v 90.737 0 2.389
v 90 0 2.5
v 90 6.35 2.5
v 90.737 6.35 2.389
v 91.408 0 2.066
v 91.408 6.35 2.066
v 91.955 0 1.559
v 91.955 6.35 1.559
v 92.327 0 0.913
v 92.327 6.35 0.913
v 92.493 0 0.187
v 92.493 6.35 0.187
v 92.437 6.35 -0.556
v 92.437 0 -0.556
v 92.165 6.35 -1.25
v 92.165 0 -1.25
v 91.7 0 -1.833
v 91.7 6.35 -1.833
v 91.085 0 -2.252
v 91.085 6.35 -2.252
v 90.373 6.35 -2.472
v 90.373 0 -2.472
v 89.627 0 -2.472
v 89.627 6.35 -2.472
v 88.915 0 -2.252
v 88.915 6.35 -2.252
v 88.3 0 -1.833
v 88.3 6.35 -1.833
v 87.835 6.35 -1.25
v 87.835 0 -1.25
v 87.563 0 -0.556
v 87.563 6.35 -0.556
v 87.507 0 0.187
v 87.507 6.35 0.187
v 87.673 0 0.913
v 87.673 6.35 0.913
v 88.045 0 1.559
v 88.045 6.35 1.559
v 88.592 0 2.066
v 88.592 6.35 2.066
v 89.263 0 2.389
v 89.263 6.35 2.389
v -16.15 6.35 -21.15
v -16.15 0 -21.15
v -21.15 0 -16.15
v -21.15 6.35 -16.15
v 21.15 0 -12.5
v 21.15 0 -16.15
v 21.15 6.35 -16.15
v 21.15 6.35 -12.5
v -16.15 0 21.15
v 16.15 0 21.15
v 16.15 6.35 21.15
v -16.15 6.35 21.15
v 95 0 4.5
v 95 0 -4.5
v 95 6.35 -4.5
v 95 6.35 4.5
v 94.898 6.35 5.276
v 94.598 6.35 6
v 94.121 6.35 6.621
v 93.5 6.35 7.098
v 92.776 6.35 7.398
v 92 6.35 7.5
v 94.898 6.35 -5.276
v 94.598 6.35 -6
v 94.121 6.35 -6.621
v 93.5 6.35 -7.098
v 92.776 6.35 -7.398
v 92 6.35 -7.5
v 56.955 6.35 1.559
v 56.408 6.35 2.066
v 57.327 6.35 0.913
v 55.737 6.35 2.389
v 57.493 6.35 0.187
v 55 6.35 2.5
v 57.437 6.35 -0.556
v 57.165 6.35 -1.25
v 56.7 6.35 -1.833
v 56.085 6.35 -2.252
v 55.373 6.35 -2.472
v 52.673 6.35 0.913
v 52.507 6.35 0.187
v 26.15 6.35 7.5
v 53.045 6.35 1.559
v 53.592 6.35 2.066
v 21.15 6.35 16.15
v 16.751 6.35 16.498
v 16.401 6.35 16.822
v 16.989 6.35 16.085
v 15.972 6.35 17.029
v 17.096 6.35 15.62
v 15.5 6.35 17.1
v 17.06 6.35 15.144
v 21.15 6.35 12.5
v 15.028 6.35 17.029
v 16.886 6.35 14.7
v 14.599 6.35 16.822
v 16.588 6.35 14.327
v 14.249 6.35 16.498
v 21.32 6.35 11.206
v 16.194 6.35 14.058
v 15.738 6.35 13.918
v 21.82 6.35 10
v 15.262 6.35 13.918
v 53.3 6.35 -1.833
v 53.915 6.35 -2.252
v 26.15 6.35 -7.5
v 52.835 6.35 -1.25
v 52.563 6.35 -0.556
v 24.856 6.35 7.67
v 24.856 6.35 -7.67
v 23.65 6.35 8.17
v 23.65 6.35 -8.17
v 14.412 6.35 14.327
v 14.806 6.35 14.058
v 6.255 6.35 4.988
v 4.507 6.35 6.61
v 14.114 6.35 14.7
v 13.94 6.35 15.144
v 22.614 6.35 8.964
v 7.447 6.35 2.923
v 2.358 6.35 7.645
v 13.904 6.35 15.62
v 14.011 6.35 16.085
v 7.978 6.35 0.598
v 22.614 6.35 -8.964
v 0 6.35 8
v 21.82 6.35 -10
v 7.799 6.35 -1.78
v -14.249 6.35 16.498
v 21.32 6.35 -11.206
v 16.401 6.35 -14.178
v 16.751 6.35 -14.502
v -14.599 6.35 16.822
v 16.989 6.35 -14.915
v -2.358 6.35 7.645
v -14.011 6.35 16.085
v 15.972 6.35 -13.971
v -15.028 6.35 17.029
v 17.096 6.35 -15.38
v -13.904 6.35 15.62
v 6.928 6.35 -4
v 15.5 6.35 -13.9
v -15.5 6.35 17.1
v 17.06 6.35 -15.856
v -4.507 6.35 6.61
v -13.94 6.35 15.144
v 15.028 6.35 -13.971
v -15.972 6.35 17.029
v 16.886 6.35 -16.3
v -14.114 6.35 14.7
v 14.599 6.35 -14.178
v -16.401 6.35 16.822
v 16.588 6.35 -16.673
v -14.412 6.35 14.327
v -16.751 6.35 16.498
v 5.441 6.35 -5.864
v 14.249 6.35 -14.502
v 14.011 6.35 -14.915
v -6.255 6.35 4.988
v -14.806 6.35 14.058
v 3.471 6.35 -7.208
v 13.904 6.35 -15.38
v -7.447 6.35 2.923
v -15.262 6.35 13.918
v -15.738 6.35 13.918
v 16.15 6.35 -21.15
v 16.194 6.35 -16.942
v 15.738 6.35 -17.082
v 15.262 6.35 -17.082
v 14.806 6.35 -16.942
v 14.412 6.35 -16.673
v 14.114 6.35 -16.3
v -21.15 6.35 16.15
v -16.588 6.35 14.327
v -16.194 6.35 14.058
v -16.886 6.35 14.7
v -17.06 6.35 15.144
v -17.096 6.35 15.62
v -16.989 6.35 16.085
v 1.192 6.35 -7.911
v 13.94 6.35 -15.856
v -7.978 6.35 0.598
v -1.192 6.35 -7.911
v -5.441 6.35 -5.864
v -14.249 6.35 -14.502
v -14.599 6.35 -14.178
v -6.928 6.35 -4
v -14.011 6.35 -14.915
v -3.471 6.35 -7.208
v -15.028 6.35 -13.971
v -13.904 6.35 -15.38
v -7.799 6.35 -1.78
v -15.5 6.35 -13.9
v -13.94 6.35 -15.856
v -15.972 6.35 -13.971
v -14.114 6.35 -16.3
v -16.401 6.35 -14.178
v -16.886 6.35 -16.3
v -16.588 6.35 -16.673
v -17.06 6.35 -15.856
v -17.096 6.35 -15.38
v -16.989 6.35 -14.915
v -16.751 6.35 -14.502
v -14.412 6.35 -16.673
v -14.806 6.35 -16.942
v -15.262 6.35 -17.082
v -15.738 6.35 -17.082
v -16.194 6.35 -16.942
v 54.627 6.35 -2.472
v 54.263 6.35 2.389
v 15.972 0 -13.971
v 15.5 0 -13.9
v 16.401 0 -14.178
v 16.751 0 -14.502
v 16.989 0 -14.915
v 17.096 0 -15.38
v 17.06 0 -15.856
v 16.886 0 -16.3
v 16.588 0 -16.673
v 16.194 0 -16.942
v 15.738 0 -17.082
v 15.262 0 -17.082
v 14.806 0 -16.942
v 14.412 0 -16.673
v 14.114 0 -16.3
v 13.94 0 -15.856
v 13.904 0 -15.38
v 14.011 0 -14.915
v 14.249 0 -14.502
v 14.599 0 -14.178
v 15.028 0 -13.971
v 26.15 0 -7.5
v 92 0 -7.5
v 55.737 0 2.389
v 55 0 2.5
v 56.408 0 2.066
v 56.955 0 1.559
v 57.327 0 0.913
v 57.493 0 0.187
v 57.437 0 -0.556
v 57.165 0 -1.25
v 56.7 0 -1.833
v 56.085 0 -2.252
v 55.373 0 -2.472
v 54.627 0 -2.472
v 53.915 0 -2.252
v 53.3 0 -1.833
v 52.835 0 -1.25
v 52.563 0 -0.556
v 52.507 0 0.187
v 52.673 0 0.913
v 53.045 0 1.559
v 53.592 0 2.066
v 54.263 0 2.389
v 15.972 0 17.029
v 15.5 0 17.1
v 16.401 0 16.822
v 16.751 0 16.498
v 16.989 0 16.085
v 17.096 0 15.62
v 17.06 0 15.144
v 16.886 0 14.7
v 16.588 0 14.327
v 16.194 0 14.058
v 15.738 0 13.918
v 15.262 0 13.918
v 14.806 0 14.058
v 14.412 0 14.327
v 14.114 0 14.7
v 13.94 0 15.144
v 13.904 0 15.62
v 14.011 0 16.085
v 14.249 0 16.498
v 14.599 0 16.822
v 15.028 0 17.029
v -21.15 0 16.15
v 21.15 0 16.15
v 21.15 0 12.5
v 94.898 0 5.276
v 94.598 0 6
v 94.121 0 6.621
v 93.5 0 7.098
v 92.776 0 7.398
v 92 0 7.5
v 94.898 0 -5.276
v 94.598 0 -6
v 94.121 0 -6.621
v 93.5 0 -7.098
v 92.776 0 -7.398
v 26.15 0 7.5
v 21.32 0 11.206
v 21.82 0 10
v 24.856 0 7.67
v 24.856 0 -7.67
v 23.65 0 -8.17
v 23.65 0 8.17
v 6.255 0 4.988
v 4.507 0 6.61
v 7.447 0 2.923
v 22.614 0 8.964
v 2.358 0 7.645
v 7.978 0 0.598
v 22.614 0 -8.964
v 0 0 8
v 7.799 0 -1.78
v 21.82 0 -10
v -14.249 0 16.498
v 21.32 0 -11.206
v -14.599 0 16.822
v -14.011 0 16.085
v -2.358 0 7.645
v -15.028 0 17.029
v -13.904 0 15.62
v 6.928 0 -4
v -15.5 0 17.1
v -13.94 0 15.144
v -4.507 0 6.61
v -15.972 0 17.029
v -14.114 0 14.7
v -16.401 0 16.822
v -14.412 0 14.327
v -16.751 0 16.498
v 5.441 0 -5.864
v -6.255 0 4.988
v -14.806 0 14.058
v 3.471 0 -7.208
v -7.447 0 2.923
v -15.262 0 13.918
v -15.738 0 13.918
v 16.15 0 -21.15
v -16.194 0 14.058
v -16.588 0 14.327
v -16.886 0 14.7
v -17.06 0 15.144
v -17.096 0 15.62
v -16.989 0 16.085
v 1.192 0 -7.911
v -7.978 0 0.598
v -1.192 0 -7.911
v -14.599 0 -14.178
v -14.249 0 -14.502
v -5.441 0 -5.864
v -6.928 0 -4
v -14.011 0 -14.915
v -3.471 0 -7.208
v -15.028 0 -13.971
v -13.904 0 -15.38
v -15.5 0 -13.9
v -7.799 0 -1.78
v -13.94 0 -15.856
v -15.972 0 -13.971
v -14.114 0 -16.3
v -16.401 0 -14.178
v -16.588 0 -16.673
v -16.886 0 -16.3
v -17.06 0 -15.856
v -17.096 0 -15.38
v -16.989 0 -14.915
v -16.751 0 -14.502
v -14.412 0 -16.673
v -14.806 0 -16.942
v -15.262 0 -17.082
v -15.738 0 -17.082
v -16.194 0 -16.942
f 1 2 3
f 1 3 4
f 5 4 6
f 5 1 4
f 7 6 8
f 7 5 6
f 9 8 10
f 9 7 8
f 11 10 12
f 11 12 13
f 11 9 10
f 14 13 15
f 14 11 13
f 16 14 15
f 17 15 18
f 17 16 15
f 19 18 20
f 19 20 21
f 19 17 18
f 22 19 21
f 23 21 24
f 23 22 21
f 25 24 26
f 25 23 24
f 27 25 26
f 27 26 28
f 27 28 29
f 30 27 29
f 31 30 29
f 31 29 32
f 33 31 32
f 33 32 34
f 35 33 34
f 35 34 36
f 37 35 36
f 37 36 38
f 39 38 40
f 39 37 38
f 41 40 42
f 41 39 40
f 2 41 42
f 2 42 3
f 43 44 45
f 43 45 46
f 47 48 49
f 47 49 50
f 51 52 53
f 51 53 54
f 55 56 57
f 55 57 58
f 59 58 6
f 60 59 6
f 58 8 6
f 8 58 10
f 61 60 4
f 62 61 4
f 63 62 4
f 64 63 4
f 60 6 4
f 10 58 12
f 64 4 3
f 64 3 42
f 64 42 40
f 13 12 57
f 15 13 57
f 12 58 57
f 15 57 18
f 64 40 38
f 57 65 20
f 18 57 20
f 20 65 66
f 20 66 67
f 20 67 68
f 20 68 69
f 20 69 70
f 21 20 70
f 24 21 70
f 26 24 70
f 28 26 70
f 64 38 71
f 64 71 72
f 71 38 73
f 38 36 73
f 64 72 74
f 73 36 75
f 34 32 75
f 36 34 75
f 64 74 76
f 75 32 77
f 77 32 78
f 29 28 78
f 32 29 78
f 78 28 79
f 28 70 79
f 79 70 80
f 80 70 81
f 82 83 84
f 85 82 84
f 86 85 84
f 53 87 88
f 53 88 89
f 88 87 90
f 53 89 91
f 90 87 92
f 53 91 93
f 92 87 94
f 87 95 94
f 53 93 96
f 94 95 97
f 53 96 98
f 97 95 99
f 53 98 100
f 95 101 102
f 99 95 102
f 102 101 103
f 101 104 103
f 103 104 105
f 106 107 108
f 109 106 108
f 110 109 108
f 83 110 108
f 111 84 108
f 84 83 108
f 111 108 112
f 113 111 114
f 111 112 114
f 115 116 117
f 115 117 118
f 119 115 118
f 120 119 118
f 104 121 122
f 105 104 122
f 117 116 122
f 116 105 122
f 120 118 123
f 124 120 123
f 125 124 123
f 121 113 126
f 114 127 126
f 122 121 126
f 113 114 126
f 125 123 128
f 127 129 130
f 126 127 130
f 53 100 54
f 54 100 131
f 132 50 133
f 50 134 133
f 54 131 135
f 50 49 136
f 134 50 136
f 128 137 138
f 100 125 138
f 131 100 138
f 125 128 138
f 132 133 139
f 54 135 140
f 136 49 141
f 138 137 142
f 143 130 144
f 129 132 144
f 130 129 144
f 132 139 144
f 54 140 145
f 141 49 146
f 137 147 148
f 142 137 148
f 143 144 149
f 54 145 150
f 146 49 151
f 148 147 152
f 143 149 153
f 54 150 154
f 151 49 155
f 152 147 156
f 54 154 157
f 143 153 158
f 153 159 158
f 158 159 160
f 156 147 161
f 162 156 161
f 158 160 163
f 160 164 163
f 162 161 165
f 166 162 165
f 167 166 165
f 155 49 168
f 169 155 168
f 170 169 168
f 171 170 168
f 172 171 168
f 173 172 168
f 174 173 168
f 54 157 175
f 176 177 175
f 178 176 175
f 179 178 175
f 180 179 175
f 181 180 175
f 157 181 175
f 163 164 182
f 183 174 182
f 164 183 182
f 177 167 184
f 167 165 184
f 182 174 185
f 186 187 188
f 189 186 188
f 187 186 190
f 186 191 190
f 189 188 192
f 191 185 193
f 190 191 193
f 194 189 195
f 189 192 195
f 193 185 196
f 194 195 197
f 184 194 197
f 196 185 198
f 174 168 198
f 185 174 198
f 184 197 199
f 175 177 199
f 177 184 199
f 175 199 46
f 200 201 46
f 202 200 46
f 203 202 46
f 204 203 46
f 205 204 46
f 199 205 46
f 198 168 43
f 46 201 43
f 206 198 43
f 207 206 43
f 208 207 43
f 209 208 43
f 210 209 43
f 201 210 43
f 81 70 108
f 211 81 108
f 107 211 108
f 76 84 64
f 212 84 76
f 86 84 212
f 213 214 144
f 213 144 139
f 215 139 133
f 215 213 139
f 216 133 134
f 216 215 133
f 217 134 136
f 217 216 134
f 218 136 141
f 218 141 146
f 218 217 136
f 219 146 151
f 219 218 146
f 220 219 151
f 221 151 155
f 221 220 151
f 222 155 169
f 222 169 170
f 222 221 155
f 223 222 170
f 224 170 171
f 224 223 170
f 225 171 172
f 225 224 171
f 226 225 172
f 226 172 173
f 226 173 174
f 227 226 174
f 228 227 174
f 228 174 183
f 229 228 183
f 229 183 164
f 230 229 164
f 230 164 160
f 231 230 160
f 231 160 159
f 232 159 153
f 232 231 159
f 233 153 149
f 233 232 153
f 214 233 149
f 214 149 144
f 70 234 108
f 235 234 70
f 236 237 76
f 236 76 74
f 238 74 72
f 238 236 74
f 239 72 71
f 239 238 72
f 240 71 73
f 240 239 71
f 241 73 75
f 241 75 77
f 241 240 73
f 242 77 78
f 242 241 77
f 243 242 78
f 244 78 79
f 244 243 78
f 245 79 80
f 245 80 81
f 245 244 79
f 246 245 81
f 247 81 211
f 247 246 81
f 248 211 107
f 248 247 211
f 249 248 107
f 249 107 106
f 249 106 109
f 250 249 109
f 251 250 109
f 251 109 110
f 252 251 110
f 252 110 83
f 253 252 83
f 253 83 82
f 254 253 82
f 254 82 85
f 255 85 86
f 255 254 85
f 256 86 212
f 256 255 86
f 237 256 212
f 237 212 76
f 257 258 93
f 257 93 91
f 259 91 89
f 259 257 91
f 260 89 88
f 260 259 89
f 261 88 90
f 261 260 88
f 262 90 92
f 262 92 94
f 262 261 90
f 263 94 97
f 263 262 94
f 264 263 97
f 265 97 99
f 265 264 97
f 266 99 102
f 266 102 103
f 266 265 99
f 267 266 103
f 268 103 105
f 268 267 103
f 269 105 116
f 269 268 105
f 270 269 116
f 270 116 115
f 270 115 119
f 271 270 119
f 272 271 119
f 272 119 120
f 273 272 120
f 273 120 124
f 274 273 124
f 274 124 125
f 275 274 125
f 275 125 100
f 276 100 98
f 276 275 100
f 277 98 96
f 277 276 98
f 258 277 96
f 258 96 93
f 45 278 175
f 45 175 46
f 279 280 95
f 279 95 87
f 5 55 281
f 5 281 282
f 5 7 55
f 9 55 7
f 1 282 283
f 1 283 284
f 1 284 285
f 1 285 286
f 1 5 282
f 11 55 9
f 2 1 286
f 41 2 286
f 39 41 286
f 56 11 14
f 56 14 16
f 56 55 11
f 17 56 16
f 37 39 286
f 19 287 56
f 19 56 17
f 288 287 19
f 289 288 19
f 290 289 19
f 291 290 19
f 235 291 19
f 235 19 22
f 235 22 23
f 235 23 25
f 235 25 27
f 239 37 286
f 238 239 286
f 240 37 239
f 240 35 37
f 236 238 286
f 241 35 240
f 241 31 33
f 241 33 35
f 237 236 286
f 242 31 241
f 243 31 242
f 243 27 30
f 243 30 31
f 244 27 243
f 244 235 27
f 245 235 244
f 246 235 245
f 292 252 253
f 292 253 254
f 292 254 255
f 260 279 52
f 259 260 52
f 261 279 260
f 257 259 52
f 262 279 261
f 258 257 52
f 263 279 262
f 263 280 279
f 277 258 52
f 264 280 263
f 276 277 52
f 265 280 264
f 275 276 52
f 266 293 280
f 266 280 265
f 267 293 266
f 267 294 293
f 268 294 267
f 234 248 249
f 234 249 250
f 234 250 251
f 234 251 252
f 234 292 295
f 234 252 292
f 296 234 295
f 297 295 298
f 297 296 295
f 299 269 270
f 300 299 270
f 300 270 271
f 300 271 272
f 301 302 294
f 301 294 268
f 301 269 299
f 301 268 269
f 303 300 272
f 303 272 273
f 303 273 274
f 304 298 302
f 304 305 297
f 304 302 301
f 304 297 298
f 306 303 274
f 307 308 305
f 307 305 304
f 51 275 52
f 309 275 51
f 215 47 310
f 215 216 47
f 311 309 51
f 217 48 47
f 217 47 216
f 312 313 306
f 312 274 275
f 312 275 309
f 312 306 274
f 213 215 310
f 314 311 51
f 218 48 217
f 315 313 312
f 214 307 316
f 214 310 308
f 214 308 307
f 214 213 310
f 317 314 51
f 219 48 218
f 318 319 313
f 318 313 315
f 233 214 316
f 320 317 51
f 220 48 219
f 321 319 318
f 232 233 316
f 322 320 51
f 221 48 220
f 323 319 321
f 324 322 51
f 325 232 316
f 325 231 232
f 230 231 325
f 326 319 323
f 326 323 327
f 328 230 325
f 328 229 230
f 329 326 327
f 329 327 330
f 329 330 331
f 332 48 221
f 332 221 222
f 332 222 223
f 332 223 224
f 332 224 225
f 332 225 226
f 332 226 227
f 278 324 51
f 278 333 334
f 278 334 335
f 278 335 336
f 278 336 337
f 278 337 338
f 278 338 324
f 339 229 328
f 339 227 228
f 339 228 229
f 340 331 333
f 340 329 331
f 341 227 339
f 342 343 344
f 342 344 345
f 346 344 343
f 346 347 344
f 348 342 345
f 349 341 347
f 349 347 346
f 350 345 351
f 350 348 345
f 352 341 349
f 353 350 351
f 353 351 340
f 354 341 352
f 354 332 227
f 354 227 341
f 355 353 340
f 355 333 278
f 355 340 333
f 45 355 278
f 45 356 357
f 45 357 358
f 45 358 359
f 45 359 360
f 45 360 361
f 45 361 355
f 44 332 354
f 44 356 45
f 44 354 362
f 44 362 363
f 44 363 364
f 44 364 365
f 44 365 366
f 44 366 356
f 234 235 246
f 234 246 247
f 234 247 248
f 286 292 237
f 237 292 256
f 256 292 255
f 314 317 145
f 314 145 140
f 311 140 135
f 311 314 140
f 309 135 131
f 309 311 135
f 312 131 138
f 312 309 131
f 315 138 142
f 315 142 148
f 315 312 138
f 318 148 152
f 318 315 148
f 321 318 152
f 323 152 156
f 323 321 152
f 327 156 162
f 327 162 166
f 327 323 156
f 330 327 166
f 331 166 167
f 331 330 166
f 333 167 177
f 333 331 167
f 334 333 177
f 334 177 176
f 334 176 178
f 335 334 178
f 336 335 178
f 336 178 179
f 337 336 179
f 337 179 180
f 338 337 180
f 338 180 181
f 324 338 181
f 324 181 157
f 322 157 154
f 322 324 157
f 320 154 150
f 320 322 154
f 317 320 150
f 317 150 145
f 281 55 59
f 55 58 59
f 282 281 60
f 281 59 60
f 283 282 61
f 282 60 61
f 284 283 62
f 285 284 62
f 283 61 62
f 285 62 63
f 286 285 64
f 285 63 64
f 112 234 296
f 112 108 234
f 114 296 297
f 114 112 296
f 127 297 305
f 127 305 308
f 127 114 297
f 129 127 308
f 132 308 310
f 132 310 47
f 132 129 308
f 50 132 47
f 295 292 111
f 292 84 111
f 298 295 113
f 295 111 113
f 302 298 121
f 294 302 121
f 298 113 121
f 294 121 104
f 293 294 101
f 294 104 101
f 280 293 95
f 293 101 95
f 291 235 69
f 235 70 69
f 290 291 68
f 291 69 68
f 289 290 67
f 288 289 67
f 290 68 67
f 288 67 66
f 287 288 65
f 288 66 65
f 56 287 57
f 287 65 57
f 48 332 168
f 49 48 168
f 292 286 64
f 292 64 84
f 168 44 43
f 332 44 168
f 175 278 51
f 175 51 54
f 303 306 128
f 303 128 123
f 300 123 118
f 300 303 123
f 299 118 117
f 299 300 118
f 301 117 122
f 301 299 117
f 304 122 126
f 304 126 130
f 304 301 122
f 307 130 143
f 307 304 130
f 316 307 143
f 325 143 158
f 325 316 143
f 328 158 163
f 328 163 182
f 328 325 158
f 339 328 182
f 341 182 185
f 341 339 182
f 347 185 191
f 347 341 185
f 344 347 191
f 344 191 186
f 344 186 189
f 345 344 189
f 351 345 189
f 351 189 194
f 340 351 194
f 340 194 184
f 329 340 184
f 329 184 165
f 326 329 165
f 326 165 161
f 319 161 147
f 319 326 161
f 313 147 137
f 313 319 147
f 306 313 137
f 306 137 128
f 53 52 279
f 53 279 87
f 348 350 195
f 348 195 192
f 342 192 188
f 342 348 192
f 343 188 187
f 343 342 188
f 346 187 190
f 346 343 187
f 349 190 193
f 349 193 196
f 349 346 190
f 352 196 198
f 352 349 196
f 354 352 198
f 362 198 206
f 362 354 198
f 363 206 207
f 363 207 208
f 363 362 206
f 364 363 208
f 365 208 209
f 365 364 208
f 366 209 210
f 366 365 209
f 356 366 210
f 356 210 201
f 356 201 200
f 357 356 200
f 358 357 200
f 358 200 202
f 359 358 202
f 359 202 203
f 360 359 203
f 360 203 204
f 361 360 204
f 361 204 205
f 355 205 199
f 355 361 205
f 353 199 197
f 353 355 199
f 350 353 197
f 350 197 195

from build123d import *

# Parameters (mm, degrees)
SKETCH1_R           = 1.6
SKETCH1_R_2         = 8
SKETCH1_R_3         = 2.5
BOSS_EXTRUDE2_DEPTH = 6.35
CHAMFER2_SIZE       = 5
FILLET1_R           = 3
FILLET2_R           = 5


with BuildPart() as part:
    # Sketch1 → Boss-Extrude2 (new body)
    with BuildSketch(Plane(origin=(0, 0, 0), x_dir=(1, 0, 0), z_dir=(0, 1, 0))):
        Polygon((-21.15, 21.15), (21.15, 21.15), (21.15, 7.5), (95, 7.5), (95, -7.5), (21.15, -7.5), (21.15, -21.15), (-21.15, -21.15), align=None)
        with Locations(Location((-15.5, 15.5, 0), (0, 0, 270))):
            Circle(SKETCH1_R, mode=Mode.SUBTRACT)
        with Locations(Location((15.5, 15.5, 0), (0, 0, 270))):
            Circle(SKETCH1_R, mode=Mode.SUBTRACT)
        with Locations(Location((15.5, -15.5, 0), (0, 0, 270))):
            Circle(SKETCH1_R, mode=Mode.SUBTRACT)
        with Locations(Location((-15.5, -15.5, 0), (0, 0, 270))):
            Circle(SKETCH1_R, mode=Mode.SUBTRACT)
        with Locations(Location((0, 0, 0), (0, 0, 270))):
            Circle(SKETCH1_R_2, mode=Mode.SUBTRACT)
        with Locations(Location((90, 0, 0), (0, 0, 270))):
            Circle(SKETCH1_R_3, mode=Mode.SUBTRACT)
        with Locations(Location((55, 0, 0), (0, 0, 270))):
            Circle(SKETCH1_R_3, mode=Mode.SUBTRACT)
    extrude(amount=BOSS_EXTRUDE2_DEPTH)

    # Chamfer2
    chamfer2_edges = [part.edges().sort_by_distance(p)[0] for p in [
        (21.15, 3.175, 21.15),
        (-21.15, 3.175, 21.15),
        (-21.15, 3.175, -21.15),
        (21.15, 3.175, -21.15),
    ]]
    chamfer(chamfer2_edges, length=CHAMFER2_SIZE)

    # Fillet1
    fillet1_edges = [part.edges().sort_by_distance(p)[0] for p in [
        (95, 3.175, -7.5),
        (95, 3.175, 7.5),
    ]]
    fillet(fillet1_edges, radius=FILLET1_R)

    # Fillet2
    fillet2_edges = [part.edges().sort_by_distance(p)[0] for p in [
        (21.15, 3.175, -7.5),
        (21.15, 3.175, 7.5),
    ]]
    fillet(fillet2_edges, radius=FILLET2_R)


solid = part.part
